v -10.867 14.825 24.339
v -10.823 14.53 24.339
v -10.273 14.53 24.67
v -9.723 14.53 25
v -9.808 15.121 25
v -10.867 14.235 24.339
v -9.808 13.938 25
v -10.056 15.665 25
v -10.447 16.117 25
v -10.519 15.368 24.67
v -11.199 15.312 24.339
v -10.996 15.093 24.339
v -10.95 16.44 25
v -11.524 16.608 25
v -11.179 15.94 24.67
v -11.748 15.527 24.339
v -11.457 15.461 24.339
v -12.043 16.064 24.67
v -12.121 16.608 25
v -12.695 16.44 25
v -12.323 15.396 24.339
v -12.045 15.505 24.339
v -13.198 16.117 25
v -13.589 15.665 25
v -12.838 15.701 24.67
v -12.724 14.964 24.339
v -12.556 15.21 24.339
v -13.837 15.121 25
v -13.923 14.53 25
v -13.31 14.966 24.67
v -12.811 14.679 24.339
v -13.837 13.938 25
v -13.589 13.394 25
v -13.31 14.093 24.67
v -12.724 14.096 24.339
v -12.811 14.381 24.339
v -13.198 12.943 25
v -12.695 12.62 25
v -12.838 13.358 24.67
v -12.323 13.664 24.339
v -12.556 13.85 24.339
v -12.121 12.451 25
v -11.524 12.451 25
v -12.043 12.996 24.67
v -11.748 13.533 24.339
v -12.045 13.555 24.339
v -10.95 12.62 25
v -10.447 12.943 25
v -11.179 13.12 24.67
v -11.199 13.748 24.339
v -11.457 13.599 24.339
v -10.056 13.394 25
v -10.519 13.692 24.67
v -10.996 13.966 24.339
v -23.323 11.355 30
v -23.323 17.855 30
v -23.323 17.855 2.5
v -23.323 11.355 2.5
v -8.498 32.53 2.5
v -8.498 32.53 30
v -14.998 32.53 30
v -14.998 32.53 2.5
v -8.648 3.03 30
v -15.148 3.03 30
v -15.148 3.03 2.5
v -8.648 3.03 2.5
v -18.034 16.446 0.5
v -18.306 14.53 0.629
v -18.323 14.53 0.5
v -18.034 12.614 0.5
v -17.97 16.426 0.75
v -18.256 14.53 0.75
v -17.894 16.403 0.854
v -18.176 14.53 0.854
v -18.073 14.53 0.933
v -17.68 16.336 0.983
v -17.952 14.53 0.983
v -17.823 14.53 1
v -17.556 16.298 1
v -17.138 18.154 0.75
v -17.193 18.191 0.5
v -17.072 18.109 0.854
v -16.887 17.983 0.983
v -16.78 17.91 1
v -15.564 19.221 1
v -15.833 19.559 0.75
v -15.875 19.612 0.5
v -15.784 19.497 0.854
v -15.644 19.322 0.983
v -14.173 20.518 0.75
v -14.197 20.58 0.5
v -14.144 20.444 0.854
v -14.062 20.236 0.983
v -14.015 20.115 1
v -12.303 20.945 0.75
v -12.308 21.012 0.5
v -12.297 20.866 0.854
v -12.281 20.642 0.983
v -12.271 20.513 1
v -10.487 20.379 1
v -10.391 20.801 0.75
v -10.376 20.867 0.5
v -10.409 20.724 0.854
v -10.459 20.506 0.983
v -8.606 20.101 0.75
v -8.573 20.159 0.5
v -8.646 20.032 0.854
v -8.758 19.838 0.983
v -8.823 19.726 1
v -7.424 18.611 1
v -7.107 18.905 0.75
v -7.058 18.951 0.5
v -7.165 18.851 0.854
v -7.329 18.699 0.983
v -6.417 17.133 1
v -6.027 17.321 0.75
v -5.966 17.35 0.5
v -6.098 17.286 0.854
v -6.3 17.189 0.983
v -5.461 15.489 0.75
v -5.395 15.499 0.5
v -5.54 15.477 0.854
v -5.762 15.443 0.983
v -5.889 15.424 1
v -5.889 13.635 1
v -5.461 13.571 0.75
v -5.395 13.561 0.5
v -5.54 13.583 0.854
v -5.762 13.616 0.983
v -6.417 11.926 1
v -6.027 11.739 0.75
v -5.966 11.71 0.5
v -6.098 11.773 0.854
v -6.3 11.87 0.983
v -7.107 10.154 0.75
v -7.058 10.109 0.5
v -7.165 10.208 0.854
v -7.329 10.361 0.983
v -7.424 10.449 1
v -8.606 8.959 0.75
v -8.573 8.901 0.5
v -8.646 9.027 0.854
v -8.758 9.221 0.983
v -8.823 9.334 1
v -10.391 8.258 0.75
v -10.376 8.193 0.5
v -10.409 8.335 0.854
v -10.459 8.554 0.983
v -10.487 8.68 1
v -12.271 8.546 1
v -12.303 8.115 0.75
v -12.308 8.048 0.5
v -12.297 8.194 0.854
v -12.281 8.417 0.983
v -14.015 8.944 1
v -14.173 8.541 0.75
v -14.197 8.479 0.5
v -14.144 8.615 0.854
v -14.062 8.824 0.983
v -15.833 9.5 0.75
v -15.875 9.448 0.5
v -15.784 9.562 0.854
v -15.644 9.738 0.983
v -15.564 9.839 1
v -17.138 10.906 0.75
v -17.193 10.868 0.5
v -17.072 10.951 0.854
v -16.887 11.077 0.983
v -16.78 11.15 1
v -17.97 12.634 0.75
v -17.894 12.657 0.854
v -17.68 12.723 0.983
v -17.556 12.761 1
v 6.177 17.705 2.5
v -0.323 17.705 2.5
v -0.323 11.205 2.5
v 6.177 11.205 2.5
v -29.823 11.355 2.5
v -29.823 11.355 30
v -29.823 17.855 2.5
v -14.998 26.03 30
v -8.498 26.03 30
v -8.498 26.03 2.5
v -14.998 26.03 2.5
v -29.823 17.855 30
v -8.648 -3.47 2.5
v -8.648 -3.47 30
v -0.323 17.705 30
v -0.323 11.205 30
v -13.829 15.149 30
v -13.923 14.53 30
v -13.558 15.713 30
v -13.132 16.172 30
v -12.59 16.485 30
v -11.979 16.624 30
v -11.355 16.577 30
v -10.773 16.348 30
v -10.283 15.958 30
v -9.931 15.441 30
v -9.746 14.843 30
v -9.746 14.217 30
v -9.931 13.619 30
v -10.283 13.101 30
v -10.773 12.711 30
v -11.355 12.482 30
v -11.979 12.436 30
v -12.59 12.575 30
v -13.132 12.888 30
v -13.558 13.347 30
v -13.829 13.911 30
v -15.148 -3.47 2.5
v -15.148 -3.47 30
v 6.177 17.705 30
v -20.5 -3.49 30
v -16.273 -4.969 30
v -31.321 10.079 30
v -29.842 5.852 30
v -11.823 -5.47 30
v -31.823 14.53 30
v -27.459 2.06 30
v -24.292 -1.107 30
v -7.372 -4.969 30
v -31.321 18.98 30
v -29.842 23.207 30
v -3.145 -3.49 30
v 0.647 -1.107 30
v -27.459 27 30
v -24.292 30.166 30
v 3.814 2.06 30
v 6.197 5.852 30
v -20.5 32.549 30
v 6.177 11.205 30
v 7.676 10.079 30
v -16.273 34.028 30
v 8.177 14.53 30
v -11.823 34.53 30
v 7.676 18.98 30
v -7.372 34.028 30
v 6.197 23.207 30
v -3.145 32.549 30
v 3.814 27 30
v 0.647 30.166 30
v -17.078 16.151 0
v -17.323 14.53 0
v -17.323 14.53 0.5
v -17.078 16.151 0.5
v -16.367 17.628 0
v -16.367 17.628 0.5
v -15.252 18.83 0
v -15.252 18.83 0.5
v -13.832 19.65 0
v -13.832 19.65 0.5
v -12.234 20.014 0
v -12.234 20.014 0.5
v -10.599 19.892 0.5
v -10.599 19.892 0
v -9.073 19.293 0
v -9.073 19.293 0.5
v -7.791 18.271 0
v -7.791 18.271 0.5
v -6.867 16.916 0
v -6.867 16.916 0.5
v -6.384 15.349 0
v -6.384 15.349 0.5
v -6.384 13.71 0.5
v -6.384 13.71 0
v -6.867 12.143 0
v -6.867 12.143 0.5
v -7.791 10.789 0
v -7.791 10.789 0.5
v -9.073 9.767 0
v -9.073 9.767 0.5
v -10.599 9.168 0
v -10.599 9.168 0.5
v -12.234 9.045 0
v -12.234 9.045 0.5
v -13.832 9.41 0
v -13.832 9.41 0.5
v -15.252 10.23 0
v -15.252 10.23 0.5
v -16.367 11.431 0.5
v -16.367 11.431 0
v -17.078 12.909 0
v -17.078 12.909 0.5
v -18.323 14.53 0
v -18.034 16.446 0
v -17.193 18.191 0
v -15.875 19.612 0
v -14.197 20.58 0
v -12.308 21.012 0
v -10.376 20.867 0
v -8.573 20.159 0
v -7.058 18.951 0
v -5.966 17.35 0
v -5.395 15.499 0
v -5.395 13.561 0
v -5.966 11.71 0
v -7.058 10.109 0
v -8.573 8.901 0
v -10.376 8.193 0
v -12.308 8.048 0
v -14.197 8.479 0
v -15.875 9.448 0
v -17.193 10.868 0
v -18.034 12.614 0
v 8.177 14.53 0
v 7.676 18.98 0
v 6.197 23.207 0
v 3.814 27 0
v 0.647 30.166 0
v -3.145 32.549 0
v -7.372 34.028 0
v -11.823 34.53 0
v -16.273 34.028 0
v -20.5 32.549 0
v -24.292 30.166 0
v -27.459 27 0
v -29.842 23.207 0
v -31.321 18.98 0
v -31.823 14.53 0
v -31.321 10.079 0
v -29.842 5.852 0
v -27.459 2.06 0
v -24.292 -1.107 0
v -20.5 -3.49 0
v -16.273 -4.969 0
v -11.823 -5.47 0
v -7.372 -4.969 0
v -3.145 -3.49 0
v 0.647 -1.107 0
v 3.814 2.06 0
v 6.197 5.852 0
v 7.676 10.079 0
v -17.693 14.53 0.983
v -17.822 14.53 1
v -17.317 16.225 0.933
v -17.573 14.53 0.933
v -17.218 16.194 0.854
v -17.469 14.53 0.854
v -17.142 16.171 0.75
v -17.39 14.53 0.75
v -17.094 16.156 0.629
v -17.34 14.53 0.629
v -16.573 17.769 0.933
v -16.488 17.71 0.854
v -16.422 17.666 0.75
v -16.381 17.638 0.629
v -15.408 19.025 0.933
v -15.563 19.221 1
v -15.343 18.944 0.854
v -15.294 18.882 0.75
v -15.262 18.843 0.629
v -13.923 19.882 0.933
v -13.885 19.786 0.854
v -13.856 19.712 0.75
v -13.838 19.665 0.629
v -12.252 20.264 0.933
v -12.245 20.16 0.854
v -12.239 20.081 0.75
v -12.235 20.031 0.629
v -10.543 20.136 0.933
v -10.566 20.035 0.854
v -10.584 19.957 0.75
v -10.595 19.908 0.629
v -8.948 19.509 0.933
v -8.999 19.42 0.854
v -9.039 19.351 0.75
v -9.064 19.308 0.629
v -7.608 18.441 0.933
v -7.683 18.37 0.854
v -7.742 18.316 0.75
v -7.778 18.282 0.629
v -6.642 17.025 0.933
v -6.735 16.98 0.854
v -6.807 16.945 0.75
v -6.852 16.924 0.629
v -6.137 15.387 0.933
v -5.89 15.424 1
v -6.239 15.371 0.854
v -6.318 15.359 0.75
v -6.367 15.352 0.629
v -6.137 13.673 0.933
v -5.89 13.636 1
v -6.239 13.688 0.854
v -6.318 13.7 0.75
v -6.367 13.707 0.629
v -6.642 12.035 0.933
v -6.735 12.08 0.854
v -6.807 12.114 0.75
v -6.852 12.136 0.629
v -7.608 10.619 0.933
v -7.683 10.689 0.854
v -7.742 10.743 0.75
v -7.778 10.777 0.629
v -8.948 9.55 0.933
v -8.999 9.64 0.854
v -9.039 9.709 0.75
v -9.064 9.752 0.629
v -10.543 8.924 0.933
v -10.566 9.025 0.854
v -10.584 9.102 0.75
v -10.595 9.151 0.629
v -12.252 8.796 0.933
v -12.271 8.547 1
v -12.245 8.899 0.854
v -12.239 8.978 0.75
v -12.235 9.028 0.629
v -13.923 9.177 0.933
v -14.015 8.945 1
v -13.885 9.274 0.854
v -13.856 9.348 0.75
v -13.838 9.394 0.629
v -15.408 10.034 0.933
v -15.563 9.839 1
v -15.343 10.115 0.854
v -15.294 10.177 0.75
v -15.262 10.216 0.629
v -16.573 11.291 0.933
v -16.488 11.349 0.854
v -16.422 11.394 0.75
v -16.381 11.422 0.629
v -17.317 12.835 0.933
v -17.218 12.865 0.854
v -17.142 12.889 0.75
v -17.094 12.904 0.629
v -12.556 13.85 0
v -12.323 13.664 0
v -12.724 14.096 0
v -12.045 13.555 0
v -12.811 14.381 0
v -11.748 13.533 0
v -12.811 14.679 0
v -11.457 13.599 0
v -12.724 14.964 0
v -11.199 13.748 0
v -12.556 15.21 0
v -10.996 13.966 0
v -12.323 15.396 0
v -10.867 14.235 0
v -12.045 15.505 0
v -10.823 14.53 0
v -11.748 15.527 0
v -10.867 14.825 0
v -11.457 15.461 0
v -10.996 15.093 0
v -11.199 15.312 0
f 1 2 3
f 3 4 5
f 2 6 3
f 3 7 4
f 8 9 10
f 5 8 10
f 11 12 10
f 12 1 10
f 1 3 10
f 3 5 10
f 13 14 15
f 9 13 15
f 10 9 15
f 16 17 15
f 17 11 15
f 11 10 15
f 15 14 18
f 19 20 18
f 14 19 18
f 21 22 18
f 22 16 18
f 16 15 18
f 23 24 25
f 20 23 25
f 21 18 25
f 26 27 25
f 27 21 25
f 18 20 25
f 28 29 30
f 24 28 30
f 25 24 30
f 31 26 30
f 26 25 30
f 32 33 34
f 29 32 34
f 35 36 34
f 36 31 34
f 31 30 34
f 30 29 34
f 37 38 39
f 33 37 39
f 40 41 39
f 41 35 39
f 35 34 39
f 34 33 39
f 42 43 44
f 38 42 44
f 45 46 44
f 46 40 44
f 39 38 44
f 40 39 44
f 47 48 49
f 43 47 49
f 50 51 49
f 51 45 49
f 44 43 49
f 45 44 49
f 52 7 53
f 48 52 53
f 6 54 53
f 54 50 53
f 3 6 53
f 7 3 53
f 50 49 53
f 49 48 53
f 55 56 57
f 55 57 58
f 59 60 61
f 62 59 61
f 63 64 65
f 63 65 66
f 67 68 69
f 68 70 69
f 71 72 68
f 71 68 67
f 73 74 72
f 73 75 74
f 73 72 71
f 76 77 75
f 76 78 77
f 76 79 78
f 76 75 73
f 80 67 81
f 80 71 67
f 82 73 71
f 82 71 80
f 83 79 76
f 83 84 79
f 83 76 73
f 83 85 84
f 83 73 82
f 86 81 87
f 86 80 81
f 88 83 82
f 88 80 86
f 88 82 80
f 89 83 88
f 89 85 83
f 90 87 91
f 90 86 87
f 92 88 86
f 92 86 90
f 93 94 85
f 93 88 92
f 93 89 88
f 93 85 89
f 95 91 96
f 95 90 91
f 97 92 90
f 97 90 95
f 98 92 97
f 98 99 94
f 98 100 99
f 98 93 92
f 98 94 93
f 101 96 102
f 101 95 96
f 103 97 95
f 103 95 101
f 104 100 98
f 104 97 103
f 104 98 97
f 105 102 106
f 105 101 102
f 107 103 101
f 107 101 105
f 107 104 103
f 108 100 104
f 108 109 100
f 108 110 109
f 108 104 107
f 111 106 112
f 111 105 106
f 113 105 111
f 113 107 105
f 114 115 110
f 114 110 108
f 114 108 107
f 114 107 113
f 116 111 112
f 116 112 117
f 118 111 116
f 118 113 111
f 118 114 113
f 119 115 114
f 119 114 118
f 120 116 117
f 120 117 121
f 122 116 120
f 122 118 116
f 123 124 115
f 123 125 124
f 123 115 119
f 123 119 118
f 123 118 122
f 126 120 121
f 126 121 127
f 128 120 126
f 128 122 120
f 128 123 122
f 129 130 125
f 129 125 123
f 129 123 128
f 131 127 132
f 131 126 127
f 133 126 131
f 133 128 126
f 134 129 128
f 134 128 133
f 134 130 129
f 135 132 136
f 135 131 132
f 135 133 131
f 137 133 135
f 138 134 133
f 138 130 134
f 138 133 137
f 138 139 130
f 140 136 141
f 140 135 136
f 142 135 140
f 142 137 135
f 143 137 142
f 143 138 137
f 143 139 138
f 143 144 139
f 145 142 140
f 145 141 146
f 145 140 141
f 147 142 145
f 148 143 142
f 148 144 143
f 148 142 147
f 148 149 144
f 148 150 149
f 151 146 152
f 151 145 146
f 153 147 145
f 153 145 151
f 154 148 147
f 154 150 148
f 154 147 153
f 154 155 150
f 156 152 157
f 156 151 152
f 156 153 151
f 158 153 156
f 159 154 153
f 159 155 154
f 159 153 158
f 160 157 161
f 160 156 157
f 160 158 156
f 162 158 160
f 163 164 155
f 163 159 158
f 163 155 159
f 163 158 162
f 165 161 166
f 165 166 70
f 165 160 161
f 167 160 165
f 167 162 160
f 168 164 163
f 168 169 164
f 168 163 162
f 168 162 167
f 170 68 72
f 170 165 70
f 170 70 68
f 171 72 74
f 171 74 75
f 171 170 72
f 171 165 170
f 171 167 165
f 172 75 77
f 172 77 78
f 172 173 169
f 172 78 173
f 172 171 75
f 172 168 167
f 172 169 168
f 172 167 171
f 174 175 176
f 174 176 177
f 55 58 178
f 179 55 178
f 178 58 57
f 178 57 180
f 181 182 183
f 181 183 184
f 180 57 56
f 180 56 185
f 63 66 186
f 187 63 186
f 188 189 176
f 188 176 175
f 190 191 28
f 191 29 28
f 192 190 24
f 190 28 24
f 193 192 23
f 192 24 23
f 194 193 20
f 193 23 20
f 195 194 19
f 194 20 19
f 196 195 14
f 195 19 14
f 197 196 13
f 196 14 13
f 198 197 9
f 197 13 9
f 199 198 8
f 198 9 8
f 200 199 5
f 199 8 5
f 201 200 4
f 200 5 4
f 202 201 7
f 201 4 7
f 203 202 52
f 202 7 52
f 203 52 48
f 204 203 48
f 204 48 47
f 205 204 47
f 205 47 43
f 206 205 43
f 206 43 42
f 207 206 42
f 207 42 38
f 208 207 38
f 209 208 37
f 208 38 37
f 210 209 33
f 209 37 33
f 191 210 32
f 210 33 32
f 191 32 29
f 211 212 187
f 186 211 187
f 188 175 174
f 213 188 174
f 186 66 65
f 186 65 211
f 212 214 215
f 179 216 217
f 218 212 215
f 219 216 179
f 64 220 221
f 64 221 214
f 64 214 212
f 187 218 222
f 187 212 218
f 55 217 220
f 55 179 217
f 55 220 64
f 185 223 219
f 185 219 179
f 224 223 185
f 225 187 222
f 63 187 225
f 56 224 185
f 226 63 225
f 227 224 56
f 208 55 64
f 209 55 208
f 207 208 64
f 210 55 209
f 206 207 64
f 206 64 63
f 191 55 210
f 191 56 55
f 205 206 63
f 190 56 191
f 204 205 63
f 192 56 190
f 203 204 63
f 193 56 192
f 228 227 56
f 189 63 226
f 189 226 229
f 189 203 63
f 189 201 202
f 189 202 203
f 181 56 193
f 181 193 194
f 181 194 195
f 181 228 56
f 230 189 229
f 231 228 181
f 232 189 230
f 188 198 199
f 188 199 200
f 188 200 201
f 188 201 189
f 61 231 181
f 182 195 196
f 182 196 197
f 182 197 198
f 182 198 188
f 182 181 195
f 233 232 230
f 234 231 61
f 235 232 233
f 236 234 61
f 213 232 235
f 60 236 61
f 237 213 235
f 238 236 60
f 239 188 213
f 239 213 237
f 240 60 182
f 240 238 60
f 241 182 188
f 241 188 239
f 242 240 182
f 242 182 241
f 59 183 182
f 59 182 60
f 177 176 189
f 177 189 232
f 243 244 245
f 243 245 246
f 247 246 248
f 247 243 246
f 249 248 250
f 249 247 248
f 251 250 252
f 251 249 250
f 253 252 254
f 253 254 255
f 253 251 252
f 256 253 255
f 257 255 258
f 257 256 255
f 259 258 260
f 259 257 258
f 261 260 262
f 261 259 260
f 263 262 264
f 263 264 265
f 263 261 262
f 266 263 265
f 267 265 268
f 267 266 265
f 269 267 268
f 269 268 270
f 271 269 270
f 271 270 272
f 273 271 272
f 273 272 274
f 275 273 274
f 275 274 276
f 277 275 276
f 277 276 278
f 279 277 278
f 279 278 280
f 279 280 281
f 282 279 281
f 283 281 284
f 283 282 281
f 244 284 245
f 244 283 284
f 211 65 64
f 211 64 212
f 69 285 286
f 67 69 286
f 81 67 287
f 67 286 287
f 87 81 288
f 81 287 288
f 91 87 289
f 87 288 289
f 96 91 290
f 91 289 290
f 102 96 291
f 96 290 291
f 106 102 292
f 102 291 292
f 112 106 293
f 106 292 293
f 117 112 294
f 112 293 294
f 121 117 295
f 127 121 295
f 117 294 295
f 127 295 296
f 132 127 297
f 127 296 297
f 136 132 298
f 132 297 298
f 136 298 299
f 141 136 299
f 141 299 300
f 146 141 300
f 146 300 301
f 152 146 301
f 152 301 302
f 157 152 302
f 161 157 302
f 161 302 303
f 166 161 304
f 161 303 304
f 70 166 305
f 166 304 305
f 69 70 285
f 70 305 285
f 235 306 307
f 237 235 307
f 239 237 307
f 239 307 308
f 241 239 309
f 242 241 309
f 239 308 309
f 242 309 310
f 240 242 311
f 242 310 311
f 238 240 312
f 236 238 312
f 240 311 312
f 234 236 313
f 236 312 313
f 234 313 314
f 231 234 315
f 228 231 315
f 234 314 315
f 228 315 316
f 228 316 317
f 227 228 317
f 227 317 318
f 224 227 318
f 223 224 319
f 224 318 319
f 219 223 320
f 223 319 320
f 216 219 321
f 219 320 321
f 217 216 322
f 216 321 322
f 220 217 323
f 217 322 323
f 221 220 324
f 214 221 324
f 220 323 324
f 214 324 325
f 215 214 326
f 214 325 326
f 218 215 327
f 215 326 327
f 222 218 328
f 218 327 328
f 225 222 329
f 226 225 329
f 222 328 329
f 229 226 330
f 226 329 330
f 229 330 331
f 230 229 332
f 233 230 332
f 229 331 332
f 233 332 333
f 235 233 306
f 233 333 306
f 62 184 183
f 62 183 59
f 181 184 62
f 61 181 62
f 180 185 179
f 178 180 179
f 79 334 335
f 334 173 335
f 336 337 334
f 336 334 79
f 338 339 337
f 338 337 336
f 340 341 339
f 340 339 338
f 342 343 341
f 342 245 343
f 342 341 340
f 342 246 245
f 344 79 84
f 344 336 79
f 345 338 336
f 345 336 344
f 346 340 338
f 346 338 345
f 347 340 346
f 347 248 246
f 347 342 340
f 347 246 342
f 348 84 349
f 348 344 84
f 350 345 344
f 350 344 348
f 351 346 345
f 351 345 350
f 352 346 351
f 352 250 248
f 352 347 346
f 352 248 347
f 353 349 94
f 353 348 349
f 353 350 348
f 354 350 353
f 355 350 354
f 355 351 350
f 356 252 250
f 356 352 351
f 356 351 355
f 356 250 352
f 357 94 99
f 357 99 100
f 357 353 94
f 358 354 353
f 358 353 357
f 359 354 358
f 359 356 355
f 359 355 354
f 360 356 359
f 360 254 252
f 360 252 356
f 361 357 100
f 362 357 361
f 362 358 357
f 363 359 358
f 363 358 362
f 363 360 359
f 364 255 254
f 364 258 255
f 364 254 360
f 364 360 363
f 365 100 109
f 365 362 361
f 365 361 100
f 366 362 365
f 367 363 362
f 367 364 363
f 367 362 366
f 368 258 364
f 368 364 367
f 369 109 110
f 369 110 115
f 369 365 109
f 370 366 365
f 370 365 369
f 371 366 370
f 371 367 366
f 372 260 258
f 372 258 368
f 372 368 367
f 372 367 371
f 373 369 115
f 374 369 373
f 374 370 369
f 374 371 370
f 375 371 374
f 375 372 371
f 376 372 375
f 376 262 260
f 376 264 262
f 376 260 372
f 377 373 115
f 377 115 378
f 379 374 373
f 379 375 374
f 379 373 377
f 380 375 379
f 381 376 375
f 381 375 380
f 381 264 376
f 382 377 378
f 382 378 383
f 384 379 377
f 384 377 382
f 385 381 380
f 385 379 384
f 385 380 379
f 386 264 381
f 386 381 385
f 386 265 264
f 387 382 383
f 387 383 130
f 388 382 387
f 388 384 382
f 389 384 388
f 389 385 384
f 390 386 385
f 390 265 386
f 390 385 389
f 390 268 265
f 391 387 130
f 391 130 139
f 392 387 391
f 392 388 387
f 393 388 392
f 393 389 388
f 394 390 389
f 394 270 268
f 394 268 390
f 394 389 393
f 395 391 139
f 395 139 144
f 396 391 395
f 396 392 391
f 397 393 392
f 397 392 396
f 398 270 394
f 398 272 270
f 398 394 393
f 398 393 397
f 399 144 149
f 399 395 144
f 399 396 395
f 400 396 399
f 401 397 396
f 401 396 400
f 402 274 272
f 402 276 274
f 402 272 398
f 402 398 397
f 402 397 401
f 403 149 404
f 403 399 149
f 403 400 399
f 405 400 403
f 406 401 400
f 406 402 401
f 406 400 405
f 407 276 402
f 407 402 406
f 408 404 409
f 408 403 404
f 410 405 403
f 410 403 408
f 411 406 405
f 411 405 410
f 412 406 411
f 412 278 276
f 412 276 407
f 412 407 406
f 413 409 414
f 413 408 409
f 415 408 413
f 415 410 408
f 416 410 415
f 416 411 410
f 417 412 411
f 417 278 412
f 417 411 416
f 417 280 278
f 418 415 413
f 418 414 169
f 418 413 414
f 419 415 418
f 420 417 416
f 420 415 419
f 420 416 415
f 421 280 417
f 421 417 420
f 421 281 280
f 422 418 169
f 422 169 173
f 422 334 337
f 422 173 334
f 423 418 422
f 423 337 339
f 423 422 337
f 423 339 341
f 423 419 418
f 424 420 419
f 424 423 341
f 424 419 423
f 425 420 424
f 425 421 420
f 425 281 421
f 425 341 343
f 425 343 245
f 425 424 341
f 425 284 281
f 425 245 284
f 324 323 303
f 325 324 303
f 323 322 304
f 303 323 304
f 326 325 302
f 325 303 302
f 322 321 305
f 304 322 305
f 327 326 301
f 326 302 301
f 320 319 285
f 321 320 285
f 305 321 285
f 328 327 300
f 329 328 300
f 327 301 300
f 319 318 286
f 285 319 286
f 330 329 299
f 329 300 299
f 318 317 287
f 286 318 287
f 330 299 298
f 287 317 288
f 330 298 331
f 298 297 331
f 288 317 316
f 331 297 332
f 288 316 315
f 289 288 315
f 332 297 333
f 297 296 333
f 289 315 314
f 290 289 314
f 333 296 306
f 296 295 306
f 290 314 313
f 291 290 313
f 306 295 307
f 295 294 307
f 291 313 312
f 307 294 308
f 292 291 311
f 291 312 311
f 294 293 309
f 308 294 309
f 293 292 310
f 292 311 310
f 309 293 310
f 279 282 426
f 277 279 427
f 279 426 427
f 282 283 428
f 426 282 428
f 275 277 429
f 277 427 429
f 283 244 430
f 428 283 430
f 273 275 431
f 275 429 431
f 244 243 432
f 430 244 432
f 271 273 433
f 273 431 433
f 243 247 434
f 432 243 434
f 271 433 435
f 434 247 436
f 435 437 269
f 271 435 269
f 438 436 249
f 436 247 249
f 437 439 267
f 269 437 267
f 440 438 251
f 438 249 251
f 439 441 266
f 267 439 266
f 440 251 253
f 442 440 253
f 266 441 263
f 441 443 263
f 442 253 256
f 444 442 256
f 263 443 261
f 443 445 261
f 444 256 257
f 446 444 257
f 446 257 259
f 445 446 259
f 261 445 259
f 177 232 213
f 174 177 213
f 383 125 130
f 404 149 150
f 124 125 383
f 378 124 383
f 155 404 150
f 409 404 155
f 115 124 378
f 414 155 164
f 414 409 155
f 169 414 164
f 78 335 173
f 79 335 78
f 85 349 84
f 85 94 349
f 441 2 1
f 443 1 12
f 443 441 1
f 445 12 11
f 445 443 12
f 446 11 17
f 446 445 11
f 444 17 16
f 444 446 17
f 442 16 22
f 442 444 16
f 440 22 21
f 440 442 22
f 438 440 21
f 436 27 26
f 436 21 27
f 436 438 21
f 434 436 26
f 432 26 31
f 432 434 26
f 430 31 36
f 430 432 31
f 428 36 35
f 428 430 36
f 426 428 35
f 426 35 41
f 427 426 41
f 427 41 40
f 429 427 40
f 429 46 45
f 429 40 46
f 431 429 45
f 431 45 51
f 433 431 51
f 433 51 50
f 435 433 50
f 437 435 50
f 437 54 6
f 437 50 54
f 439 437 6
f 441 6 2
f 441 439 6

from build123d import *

# Parameters (mm, degrees)
SKETCH1_R                       = 20
SKETCH1_R_2                     = 1
BOSS_EXTRUDE1_DEPTH             = 30
TAP_DRILL_FOR_M5X0_8_TAP1_D     = 4.2
TAP_DRILL_FOR_M5X0_8_TAP1_DEPTH = 5
TAP_DRILL_FOR_M5X0_8_TAP1_TIP   = 1.2618073
SKETCH4_W                       = 6.5
SKETCH4_H                       = 6.5
CUT_EXTRUDE1_DEPTH              = 27.5
CIRPATTERN1_COUNT               = 4
SKETCH5_R                       = 6.5
SKETCH5_R_2                     = 5.5
CUT_EXTRUDE2_DEPTH              = 1
FILLET3_R                       = 0.5


with BuildPart() as part:
    # Sketch1 → Boss-Extrude1 (new body)
    with BuildSketch(Plane.XY):
        with Locations((-11.822558412, 14.529752947)):
            Circle(SKETCH1_R)
        with Locations((-11.822558412, 14.529752947)):
            Circle(SKETCH1_R_2, mode=Mode.SUBTRACT)
    extrude(amount=BOSS_EXTRUDE1_DEPTH)

    # Tap Drill for M5x0.8 Tap1
    with Locations(Plane.XY.offset(30)):
        with Locations((-11.822558412, 14.529752947)):
            Hole(TAP_DRILL_FOR_M5X0_8_TAP1_D / 2, depth=TAP_DRILL_FOR_M5X0_8_TAP1_DEPTH)
            with Locations((0, 0, -(TAP_DRILL_FOR_M5X0_8_TAP1_DEPTH + TAP_DRILL_FOR_M5X0_8_TAP1_TIP / 2))):  # 118° drill point
                Cone(0, TAP_DRILL_FOR_M5X0_8_TAP1_D / 2, TAP_DRILL_FOR_M5X0_8_TAP1_TIP, mode=Mode.SUBTRACT)

    # Sketch4 → Cut-Extrude1 (cut)
    with BuildSketch(Plane.XY.offset(30)):
        with Locations((2.927441588, 14.454752947)):
            Rectangle(SKETCH4_W, SKETCH4_H)
    cut_extrude1 = extrude(amount=-CUT_EXTRUDE1_DEPTH, mode=Mode.SUBTRACT)

    # CirPattern1: Cut-Extrude1 ×4 about axis
    cirpattern1_axis = Axis((-11.822558412, 14.529752947, 0), (0, 0, 1))
    for i in range(1, CIRPATTERN1_COUNT):
        add(cut_extrude1.rotate(cirpattern1_axis, i * 360 / CIRPATTERN1_COUNT), mode=Mode.SUBTRACT)

    # Sketch5 → Cut-Extrude2 (cut)
    with BuildSketch(Plane(origin=(0, 0, 0), x_dir=(-1, 0, 0), z_dir=(0, 0, -1))):
        with Locations((11.822558412, 14.529752947)):
            Circle(SKETCH5_R)
        with Locations((11.822558412, 14.529752947)):
            Circle(SKETCH5_R_2, mode=Mode.SUBTRACT)
    extrude(amount=-CUT_EXTRUDE2_DEPTH, mode=Mode.SUBTRACT)

    # Fillet3
    fillet3_edges = [part.edges().sort_by_distance(p)[0] for p in [
        (-5.322558412, 14.529752947, 1),
        (-6.322558412, 14.529752947, 1),
    ]]
    fillet(fillet3_edges, radius=FILLET3_R - 0.0001)  # a hair under: the kernel refuses the full size


solid = part.part
